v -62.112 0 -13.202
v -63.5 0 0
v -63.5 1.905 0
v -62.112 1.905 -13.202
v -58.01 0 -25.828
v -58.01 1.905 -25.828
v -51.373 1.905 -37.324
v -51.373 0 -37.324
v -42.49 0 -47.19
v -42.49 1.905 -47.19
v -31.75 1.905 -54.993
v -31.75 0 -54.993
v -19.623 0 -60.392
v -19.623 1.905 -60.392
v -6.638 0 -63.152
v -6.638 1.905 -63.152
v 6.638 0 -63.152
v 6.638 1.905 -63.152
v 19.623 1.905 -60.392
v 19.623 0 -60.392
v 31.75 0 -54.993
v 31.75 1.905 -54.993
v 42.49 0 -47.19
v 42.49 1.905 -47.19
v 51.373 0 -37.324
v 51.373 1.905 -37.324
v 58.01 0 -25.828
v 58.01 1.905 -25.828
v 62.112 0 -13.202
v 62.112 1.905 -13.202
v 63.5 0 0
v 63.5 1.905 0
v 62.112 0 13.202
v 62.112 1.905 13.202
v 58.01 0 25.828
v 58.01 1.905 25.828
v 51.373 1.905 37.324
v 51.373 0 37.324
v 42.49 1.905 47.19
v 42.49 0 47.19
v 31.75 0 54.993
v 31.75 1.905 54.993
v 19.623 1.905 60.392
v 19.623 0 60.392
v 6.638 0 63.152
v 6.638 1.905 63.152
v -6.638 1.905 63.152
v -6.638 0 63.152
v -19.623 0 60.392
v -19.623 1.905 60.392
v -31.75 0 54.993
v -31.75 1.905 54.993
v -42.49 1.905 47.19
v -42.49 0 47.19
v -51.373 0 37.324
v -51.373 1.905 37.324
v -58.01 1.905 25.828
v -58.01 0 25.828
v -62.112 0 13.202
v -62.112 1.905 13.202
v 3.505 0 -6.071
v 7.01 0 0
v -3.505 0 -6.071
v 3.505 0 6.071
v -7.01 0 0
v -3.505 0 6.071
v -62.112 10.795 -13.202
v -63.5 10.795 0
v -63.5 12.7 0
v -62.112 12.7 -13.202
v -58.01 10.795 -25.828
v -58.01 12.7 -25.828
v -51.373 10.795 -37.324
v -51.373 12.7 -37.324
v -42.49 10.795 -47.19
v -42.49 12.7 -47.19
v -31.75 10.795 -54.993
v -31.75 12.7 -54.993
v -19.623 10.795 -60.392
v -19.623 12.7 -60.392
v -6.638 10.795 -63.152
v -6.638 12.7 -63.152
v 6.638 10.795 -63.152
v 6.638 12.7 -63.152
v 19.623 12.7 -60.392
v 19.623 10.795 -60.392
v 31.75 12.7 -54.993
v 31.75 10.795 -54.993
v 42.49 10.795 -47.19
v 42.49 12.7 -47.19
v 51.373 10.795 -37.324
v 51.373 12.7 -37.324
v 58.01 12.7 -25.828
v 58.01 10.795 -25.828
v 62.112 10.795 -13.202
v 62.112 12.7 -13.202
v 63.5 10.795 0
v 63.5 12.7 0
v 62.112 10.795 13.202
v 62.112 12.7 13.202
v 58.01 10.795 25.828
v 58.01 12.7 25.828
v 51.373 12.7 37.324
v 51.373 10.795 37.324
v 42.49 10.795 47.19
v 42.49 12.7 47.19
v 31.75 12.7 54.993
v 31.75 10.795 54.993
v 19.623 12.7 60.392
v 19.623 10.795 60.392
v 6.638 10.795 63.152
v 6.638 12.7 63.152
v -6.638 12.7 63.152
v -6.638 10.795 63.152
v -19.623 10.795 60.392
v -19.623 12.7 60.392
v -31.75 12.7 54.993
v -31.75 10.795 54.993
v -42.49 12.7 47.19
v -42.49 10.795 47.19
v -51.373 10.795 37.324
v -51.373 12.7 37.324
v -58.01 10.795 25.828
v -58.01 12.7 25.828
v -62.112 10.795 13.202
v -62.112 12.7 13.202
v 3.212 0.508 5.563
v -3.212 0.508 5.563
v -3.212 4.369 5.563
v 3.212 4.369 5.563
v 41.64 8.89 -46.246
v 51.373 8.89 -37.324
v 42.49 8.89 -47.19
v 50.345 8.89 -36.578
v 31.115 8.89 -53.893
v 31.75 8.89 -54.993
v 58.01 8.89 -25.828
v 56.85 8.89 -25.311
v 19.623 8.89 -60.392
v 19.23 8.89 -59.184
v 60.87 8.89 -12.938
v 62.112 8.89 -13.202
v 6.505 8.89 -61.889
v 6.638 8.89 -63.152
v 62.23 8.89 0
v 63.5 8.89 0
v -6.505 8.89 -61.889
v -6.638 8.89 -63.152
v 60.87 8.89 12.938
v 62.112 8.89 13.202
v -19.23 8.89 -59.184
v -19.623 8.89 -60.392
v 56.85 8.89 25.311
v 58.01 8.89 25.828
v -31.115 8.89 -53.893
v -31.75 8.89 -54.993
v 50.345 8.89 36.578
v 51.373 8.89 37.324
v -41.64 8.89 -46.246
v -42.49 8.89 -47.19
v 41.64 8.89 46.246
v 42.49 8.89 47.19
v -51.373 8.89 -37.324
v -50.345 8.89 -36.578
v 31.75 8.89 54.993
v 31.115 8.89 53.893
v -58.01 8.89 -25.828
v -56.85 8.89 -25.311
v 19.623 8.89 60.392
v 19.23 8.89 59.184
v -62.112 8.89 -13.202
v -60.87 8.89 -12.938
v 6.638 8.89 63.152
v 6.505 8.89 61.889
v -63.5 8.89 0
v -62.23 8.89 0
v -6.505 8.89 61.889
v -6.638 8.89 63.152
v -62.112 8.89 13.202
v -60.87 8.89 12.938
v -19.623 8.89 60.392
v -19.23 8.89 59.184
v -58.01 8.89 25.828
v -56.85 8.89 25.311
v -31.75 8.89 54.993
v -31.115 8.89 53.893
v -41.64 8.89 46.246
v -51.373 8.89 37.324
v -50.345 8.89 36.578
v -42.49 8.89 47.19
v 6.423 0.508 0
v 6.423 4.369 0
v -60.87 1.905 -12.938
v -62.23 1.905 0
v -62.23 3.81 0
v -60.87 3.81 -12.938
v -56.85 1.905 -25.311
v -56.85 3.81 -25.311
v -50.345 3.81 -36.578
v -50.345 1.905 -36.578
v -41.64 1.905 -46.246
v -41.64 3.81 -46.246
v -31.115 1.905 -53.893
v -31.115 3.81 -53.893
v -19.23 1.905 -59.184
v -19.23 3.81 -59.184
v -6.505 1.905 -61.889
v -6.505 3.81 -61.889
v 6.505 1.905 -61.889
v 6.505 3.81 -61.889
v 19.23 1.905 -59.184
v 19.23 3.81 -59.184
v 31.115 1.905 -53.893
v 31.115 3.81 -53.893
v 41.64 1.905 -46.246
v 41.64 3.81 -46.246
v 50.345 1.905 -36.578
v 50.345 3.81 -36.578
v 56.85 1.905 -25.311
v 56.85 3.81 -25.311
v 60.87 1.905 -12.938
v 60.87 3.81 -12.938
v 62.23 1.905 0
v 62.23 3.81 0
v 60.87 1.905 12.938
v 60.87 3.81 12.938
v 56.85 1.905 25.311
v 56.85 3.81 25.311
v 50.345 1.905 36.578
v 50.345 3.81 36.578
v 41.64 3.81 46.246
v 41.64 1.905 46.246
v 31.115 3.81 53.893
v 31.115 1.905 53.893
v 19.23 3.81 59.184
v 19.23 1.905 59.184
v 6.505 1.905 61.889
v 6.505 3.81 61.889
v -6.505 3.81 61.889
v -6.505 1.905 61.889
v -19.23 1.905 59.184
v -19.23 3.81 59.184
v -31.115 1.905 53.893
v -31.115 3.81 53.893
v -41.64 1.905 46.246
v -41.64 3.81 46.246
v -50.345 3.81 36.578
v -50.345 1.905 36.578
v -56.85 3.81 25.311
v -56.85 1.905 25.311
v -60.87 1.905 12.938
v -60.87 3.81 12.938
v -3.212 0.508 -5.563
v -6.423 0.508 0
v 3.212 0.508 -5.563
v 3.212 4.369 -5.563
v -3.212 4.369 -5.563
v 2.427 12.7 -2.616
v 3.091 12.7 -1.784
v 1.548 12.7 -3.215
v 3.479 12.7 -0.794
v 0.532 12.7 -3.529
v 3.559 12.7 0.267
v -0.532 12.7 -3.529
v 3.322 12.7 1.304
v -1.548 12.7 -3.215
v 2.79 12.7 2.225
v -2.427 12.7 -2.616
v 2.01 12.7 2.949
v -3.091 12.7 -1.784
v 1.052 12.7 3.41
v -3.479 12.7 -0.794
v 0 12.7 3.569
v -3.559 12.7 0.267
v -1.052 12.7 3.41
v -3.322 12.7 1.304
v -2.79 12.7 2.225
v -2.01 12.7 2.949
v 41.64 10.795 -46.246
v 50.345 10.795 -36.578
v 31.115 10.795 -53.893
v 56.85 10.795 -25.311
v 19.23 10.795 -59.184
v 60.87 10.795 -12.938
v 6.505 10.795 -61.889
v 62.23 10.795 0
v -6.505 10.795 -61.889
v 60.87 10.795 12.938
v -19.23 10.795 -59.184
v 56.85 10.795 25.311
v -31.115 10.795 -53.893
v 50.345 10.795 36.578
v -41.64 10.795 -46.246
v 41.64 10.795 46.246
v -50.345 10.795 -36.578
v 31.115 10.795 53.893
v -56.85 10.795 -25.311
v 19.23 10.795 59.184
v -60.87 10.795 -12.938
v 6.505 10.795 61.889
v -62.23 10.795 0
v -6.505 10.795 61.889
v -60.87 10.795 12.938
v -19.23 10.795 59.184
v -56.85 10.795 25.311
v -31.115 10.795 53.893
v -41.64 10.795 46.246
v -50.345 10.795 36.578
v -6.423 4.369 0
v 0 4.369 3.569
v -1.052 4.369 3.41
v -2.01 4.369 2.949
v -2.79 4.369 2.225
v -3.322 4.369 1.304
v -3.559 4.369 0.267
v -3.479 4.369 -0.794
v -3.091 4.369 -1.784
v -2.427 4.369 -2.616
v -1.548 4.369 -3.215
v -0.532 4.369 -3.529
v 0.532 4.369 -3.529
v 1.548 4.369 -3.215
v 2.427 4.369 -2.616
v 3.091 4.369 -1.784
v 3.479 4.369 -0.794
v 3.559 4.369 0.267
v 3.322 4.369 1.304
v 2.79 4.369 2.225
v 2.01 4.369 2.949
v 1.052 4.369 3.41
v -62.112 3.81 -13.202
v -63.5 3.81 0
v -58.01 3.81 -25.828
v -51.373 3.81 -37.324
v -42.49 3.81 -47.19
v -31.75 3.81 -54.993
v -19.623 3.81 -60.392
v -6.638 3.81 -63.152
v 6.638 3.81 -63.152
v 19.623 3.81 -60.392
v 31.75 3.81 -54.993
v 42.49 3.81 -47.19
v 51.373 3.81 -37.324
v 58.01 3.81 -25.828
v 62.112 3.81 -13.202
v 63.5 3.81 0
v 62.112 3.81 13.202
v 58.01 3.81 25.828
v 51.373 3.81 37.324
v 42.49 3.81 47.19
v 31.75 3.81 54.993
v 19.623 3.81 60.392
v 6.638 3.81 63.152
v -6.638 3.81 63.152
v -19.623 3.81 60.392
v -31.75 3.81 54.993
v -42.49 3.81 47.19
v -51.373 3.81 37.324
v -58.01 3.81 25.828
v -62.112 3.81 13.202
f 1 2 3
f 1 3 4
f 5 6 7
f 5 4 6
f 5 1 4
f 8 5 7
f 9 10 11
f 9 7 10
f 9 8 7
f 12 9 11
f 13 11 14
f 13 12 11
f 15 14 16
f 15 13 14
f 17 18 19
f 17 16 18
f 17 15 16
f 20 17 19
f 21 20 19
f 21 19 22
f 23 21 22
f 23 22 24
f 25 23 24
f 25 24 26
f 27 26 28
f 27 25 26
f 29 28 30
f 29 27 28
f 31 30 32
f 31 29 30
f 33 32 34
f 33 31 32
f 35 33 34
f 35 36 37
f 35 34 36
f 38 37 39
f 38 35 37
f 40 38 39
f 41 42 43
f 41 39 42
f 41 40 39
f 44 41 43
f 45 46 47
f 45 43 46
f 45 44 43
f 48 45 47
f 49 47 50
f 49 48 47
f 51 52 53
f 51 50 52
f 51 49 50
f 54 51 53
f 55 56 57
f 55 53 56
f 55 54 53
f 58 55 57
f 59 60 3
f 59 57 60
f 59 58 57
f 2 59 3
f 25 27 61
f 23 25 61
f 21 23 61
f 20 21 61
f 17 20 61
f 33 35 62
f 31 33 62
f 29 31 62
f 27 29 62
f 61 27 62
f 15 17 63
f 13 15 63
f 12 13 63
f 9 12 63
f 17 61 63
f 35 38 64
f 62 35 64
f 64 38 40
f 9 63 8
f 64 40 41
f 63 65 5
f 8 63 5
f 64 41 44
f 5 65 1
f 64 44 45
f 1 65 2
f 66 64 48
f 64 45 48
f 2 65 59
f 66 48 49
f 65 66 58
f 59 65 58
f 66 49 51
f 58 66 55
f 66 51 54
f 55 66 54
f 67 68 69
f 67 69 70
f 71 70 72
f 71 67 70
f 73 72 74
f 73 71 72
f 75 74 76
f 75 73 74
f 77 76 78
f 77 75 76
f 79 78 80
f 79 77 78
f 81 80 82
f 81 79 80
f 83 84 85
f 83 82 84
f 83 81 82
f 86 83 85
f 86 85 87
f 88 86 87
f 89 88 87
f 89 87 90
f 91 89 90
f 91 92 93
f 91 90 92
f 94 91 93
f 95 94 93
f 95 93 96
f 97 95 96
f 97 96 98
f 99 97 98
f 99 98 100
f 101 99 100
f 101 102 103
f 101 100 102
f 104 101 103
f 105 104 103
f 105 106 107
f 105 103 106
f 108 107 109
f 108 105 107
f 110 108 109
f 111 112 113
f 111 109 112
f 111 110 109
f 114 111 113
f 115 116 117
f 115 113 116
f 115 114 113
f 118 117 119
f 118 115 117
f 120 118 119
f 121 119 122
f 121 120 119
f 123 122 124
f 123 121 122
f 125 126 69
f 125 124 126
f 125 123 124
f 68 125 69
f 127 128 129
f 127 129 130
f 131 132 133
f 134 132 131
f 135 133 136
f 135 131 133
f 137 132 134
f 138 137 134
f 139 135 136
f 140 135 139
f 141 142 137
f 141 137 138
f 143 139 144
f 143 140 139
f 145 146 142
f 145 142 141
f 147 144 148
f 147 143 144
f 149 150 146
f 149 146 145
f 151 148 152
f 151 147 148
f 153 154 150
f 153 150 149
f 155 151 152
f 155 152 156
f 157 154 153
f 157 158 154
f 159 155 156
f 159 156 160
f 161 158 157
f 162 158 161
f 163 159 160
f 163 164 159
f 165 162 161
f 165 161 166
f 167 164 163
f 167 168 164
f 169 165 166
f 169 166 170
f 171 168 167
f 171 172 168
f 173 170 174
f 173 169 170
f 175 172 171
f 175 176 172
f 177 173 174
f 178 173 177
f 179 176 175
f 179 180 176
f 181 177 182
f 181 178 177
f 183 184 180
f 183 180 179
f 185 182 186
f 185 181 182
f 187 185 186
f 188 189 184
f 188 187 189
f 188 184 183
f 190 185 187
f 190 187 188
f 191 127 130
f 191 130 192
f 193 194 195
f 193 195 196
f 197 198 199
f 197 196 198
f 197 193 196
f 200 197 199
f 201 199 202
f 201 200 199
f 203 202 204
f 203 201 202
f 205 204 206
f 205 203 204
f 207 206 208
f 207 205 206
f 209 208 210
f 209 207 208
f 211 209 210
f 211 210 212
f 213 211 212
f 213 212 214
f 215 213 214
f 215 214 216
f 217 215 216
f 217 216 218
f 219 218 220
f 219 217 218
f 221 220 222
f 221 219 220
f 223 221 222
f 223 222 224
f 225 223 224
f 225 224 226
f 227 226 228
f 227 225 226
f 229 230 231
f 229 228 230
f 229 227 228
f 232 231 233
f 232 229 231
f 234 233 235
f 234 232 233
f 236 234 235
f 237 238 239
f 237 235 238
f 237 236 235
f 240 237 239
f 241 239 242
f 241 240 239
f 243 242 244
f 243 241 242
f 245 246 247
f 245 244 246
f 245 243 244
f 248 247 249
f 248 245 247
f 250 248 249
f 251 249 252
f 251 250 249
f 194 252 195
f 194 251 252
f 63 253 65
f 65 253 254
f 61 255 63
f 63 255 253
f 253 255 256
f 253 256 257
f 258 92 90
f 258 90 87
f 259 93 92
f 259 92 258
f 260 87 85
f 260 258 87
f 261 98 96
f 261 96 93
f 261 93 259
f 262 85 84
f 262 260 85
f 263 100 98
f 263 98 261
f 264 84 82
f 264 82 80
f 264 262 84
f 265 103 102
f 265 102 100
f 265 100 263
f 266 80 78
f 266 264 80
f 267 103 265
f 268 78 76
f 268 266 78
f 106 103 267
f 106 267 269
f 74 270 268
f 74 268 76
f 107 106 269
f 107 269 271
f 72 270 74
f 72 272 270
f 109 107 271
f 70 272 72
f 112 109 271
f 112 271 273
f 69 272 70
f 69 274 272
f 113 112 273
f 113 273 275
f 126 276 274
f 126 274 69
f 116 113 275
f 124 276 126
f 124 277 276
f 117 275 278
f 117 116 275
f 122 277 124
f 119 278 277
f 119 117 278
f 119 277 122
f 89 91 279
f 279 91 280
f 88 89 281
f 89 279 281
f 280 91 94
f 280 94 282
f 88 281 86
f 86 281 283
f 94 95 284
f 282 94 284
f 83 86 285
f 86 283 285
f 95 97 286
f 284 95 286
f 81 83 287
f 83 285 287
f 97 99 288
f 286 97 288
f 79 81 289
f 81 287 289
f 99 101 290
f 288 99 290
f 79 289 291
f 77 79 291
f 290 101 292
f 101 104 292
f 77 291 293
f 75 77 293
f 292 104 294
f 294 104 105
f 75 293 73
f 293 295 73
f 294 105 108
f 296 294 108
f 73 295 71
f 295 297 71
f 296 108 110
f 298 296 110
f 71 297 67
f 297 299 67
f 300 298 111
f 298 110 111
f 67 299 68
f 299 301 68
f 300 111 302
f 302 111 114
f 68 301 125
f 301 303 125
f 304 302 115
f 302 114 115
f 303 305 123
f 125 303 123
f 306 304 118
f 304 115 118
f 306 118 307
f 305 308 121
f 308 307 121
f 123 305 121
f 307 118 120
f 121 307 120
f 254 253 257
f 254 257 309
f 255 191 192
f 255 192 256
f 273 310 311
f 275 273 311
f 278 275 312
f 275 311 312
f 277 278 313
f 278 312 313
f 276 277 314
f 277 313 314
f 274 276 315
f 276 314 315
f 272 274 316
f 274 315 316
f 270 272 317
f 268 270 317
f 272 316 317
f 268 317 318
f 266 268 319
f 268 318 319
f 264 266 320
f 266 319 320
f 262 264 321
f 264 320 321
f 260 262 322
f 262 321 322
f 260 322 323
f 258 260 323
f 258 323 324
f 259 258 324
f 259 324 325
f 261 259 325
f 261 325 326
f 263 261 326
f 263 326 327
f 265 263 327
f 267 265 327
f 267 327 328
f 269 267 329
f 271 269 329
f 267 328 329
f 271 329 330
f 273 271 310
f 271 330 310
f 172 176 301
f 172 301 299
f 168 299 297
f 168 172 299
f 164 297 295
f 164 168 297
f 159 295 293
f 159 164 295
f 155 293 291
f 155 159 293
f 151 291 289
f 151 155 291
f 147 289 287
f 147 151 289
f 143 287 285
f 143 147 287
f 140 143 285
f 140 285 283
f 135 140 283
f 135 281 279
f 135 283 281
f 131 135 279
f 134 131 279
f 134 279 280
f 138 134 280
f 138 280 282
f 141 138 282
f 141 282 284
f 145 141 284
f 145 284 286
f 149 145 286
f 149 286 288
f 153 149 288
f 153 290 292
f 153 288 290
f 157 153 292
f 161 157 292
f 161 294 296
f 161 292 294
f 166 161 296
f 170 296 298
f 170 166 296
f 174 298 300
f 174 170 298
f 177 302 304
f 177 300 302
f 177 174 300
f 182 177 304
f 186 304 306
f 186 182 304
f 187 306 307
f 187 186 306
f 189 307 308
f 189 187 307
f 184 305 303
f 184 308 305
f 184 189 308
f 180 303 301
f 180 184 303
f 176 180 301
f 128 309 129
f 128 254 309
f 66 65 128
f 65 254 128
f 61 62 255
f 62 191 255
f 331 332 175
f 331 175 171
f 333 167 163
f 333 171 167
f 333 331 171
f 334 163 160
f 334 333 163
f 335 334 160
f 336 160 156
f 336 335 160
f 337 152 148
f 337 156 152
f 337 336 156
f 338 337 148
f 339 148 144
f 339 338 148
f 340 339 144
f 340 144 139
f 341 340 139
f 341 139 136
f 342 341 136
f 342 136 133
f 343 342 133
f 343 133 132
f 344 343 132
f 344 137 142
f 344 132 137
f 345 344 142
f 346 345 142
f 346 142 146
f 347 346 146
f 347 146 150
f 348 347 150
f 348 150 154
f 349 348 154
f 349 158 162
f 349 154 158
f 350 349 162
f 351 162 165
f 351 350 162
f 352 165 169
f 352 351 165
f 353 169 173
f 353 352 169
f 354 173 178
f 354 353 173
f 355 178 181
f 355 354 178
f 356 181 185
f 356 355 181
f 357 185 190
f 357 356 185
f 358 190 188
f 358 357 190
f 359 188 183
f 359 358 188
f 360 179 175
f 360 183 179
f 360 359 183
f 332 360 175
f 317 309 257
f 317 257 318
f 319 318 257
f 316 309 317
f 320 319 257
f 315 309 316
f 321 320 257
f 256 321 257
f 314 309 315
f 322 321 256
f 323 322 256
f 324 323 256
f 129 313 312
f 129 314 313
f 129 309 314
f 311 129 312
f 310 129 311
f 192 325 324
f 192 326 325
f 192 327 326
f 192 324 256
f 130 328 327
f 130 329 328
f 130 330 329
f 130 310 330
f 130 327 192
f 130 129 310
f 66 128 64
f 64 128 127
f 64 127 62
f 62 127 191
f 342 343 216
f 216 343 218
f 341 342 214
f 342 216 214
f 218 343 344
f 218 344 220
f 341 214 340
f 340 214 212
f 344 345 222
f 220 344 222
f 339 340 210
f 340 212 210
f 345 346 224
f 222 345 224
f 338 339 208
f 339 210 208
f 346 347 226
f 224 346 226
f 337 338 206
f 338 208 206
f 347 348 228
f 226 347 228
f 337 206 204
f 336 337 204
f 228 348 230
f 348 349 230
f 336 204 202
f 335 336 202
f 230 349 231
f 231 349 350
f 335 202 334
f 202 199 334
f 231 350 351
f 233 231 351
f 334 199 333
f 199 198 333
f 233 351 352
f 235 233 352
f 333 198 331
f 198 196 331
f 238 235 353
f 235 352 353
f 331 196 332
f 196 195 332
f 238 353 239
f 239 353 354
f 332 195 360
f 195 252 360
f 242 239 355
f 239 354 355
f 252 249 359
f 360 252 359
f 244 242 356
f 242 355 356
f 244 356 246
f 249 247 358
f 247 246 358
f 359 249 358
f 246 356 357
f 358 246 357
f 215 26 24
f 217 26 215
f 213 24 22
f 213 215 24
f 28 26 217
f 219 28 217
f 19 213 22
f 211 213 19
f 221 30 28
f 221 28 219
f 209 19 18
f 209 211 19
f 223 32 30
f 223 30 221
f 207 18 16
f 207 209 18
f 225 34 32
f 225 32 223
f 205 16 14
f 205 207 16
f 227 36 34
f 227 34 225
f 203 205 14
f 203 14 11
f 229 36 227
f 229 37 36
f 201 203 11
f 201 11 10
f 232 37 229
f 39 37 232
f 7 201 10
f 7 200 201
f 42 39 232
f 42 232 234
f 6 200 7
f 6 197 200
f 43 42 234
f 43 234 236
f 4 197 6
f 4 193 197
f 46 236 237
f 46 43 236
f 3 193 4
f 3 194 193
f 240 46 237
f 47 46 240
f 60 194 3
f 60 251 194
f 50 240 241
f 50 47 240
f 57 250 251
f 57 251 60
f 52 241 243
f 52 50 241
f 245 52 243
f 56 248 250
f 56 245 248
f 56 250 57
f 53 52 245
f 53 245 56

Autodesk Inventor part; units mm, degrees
ref_plane "YZ Plane" through (0, 0, 0) normal (1, 0, 0) x (0, 1, 0)
ref_plane "XZ Plane" through (0, 0, 0) normal (0, 1, 0) x (-1, 0, 0)
ref_plane "XY Plane" through (0, 0, 0) normal (0, 0, 1) x (1, 0, 0)
sketch "Sketch1" plane through (0, 0, 0) normal (0, 1, 0) x (-1, 0, 0)
  circle A0 centre (0, 0) radius 63.5
  dimension "d0" = 127
extrude "Extrusion1" add sketch "Sketch1" along normal blind 12.7
sketch "Sketch2" plane through (0, 12.7, 0) normal (0, 1, 0) x (1, 0, 0)
  point P0 (0, 0)
  point P1 (26.4475, 5.8254)
hole "Hole1" at (0, 12.7, 0) direction (0, -1, 0) diameter 7.1374 end through all clearance for "Hex Head Bolt" size "1/4" standard "Ansi Unified Screw Threads"
sketch "Sketch3" plane through (0, 0, 0) normal (0, -1, 0) x (1, 0, 0)
  circle A0 centre (0, 0) radius 3.5687 projected
  line L0 (6.4231, 0) -> (3.2116, -5.5626)
  line L1 (3.2116, -5.5626) -> (-3.2116, -5.5626)
  line L2 (-3.2116, -5.5626) -> (-6.4231, 0)
  line L3 (-6.4231, 0) -> (-3.2116, 5.5626)
  line L4 (-3.2116, 5.5626) -> (3.2116, 5.5626)
  line L5 (3.2116, 5.5626) -> (6.4231, 0)
  dimension "d10" = 11.1252
extrude "Extrusion2" cut sketch "Sketch3" against normal blind 4.3688 contours A0 | L0 L1 L2 L3 L4 L5
chamfer "Chamfer1" distance 0.508 angle 45 6 edges at (4.8174, 0, 2.7813) (0, 0, 5.5626) (-4.8174, 0, 2.7813) (-4.8174, 0, -2.7813) (0, 0, -5.5626) (4.8174, 0, -2.7813)
sketch "Sketch4" plane through (0, 0, 0) normal (0, 0, 1) x (1, 0, 0)
  line L0 (-63.5, 0) -> (-63.5, 12.7) projected
  line L1 (-63.5, 3.81) -> (-62.23, 3.81)
  line L2 (-62.23, 3.81) -> (-62.23, 1.905)
  line L3 (-62.23, 1.905) -> (-63.5, 1.905)
  line L4 (-63.5, 1.905) -> (-63.5, 3.81)
  line L5 (-63.5, 10.795) -> (-62.23, 10.795)
  line L6 (-62.23, 10.795) -> (-62.23, 8.89)
  line L7 (-62.23, 8.89) -> (-63.5, 8.89)
  line L8 (-63.5, 8.89) -> (-63.5, 10.795)
  line L9 (-63.5, 6.35) -> (-70.565, 6.35)
  line L10 (0, 0) -> (0, 18.3077)
  dimension "d16" = 1.27
  dimension "d17" = 1.905
  dimension "d18" = 5.08
revolve "Revolution1" cut sketch "Sketch4" angle 360 about axis through (0, 0, 0) along (0, 1, 0)
properties part number "Piston Head"
